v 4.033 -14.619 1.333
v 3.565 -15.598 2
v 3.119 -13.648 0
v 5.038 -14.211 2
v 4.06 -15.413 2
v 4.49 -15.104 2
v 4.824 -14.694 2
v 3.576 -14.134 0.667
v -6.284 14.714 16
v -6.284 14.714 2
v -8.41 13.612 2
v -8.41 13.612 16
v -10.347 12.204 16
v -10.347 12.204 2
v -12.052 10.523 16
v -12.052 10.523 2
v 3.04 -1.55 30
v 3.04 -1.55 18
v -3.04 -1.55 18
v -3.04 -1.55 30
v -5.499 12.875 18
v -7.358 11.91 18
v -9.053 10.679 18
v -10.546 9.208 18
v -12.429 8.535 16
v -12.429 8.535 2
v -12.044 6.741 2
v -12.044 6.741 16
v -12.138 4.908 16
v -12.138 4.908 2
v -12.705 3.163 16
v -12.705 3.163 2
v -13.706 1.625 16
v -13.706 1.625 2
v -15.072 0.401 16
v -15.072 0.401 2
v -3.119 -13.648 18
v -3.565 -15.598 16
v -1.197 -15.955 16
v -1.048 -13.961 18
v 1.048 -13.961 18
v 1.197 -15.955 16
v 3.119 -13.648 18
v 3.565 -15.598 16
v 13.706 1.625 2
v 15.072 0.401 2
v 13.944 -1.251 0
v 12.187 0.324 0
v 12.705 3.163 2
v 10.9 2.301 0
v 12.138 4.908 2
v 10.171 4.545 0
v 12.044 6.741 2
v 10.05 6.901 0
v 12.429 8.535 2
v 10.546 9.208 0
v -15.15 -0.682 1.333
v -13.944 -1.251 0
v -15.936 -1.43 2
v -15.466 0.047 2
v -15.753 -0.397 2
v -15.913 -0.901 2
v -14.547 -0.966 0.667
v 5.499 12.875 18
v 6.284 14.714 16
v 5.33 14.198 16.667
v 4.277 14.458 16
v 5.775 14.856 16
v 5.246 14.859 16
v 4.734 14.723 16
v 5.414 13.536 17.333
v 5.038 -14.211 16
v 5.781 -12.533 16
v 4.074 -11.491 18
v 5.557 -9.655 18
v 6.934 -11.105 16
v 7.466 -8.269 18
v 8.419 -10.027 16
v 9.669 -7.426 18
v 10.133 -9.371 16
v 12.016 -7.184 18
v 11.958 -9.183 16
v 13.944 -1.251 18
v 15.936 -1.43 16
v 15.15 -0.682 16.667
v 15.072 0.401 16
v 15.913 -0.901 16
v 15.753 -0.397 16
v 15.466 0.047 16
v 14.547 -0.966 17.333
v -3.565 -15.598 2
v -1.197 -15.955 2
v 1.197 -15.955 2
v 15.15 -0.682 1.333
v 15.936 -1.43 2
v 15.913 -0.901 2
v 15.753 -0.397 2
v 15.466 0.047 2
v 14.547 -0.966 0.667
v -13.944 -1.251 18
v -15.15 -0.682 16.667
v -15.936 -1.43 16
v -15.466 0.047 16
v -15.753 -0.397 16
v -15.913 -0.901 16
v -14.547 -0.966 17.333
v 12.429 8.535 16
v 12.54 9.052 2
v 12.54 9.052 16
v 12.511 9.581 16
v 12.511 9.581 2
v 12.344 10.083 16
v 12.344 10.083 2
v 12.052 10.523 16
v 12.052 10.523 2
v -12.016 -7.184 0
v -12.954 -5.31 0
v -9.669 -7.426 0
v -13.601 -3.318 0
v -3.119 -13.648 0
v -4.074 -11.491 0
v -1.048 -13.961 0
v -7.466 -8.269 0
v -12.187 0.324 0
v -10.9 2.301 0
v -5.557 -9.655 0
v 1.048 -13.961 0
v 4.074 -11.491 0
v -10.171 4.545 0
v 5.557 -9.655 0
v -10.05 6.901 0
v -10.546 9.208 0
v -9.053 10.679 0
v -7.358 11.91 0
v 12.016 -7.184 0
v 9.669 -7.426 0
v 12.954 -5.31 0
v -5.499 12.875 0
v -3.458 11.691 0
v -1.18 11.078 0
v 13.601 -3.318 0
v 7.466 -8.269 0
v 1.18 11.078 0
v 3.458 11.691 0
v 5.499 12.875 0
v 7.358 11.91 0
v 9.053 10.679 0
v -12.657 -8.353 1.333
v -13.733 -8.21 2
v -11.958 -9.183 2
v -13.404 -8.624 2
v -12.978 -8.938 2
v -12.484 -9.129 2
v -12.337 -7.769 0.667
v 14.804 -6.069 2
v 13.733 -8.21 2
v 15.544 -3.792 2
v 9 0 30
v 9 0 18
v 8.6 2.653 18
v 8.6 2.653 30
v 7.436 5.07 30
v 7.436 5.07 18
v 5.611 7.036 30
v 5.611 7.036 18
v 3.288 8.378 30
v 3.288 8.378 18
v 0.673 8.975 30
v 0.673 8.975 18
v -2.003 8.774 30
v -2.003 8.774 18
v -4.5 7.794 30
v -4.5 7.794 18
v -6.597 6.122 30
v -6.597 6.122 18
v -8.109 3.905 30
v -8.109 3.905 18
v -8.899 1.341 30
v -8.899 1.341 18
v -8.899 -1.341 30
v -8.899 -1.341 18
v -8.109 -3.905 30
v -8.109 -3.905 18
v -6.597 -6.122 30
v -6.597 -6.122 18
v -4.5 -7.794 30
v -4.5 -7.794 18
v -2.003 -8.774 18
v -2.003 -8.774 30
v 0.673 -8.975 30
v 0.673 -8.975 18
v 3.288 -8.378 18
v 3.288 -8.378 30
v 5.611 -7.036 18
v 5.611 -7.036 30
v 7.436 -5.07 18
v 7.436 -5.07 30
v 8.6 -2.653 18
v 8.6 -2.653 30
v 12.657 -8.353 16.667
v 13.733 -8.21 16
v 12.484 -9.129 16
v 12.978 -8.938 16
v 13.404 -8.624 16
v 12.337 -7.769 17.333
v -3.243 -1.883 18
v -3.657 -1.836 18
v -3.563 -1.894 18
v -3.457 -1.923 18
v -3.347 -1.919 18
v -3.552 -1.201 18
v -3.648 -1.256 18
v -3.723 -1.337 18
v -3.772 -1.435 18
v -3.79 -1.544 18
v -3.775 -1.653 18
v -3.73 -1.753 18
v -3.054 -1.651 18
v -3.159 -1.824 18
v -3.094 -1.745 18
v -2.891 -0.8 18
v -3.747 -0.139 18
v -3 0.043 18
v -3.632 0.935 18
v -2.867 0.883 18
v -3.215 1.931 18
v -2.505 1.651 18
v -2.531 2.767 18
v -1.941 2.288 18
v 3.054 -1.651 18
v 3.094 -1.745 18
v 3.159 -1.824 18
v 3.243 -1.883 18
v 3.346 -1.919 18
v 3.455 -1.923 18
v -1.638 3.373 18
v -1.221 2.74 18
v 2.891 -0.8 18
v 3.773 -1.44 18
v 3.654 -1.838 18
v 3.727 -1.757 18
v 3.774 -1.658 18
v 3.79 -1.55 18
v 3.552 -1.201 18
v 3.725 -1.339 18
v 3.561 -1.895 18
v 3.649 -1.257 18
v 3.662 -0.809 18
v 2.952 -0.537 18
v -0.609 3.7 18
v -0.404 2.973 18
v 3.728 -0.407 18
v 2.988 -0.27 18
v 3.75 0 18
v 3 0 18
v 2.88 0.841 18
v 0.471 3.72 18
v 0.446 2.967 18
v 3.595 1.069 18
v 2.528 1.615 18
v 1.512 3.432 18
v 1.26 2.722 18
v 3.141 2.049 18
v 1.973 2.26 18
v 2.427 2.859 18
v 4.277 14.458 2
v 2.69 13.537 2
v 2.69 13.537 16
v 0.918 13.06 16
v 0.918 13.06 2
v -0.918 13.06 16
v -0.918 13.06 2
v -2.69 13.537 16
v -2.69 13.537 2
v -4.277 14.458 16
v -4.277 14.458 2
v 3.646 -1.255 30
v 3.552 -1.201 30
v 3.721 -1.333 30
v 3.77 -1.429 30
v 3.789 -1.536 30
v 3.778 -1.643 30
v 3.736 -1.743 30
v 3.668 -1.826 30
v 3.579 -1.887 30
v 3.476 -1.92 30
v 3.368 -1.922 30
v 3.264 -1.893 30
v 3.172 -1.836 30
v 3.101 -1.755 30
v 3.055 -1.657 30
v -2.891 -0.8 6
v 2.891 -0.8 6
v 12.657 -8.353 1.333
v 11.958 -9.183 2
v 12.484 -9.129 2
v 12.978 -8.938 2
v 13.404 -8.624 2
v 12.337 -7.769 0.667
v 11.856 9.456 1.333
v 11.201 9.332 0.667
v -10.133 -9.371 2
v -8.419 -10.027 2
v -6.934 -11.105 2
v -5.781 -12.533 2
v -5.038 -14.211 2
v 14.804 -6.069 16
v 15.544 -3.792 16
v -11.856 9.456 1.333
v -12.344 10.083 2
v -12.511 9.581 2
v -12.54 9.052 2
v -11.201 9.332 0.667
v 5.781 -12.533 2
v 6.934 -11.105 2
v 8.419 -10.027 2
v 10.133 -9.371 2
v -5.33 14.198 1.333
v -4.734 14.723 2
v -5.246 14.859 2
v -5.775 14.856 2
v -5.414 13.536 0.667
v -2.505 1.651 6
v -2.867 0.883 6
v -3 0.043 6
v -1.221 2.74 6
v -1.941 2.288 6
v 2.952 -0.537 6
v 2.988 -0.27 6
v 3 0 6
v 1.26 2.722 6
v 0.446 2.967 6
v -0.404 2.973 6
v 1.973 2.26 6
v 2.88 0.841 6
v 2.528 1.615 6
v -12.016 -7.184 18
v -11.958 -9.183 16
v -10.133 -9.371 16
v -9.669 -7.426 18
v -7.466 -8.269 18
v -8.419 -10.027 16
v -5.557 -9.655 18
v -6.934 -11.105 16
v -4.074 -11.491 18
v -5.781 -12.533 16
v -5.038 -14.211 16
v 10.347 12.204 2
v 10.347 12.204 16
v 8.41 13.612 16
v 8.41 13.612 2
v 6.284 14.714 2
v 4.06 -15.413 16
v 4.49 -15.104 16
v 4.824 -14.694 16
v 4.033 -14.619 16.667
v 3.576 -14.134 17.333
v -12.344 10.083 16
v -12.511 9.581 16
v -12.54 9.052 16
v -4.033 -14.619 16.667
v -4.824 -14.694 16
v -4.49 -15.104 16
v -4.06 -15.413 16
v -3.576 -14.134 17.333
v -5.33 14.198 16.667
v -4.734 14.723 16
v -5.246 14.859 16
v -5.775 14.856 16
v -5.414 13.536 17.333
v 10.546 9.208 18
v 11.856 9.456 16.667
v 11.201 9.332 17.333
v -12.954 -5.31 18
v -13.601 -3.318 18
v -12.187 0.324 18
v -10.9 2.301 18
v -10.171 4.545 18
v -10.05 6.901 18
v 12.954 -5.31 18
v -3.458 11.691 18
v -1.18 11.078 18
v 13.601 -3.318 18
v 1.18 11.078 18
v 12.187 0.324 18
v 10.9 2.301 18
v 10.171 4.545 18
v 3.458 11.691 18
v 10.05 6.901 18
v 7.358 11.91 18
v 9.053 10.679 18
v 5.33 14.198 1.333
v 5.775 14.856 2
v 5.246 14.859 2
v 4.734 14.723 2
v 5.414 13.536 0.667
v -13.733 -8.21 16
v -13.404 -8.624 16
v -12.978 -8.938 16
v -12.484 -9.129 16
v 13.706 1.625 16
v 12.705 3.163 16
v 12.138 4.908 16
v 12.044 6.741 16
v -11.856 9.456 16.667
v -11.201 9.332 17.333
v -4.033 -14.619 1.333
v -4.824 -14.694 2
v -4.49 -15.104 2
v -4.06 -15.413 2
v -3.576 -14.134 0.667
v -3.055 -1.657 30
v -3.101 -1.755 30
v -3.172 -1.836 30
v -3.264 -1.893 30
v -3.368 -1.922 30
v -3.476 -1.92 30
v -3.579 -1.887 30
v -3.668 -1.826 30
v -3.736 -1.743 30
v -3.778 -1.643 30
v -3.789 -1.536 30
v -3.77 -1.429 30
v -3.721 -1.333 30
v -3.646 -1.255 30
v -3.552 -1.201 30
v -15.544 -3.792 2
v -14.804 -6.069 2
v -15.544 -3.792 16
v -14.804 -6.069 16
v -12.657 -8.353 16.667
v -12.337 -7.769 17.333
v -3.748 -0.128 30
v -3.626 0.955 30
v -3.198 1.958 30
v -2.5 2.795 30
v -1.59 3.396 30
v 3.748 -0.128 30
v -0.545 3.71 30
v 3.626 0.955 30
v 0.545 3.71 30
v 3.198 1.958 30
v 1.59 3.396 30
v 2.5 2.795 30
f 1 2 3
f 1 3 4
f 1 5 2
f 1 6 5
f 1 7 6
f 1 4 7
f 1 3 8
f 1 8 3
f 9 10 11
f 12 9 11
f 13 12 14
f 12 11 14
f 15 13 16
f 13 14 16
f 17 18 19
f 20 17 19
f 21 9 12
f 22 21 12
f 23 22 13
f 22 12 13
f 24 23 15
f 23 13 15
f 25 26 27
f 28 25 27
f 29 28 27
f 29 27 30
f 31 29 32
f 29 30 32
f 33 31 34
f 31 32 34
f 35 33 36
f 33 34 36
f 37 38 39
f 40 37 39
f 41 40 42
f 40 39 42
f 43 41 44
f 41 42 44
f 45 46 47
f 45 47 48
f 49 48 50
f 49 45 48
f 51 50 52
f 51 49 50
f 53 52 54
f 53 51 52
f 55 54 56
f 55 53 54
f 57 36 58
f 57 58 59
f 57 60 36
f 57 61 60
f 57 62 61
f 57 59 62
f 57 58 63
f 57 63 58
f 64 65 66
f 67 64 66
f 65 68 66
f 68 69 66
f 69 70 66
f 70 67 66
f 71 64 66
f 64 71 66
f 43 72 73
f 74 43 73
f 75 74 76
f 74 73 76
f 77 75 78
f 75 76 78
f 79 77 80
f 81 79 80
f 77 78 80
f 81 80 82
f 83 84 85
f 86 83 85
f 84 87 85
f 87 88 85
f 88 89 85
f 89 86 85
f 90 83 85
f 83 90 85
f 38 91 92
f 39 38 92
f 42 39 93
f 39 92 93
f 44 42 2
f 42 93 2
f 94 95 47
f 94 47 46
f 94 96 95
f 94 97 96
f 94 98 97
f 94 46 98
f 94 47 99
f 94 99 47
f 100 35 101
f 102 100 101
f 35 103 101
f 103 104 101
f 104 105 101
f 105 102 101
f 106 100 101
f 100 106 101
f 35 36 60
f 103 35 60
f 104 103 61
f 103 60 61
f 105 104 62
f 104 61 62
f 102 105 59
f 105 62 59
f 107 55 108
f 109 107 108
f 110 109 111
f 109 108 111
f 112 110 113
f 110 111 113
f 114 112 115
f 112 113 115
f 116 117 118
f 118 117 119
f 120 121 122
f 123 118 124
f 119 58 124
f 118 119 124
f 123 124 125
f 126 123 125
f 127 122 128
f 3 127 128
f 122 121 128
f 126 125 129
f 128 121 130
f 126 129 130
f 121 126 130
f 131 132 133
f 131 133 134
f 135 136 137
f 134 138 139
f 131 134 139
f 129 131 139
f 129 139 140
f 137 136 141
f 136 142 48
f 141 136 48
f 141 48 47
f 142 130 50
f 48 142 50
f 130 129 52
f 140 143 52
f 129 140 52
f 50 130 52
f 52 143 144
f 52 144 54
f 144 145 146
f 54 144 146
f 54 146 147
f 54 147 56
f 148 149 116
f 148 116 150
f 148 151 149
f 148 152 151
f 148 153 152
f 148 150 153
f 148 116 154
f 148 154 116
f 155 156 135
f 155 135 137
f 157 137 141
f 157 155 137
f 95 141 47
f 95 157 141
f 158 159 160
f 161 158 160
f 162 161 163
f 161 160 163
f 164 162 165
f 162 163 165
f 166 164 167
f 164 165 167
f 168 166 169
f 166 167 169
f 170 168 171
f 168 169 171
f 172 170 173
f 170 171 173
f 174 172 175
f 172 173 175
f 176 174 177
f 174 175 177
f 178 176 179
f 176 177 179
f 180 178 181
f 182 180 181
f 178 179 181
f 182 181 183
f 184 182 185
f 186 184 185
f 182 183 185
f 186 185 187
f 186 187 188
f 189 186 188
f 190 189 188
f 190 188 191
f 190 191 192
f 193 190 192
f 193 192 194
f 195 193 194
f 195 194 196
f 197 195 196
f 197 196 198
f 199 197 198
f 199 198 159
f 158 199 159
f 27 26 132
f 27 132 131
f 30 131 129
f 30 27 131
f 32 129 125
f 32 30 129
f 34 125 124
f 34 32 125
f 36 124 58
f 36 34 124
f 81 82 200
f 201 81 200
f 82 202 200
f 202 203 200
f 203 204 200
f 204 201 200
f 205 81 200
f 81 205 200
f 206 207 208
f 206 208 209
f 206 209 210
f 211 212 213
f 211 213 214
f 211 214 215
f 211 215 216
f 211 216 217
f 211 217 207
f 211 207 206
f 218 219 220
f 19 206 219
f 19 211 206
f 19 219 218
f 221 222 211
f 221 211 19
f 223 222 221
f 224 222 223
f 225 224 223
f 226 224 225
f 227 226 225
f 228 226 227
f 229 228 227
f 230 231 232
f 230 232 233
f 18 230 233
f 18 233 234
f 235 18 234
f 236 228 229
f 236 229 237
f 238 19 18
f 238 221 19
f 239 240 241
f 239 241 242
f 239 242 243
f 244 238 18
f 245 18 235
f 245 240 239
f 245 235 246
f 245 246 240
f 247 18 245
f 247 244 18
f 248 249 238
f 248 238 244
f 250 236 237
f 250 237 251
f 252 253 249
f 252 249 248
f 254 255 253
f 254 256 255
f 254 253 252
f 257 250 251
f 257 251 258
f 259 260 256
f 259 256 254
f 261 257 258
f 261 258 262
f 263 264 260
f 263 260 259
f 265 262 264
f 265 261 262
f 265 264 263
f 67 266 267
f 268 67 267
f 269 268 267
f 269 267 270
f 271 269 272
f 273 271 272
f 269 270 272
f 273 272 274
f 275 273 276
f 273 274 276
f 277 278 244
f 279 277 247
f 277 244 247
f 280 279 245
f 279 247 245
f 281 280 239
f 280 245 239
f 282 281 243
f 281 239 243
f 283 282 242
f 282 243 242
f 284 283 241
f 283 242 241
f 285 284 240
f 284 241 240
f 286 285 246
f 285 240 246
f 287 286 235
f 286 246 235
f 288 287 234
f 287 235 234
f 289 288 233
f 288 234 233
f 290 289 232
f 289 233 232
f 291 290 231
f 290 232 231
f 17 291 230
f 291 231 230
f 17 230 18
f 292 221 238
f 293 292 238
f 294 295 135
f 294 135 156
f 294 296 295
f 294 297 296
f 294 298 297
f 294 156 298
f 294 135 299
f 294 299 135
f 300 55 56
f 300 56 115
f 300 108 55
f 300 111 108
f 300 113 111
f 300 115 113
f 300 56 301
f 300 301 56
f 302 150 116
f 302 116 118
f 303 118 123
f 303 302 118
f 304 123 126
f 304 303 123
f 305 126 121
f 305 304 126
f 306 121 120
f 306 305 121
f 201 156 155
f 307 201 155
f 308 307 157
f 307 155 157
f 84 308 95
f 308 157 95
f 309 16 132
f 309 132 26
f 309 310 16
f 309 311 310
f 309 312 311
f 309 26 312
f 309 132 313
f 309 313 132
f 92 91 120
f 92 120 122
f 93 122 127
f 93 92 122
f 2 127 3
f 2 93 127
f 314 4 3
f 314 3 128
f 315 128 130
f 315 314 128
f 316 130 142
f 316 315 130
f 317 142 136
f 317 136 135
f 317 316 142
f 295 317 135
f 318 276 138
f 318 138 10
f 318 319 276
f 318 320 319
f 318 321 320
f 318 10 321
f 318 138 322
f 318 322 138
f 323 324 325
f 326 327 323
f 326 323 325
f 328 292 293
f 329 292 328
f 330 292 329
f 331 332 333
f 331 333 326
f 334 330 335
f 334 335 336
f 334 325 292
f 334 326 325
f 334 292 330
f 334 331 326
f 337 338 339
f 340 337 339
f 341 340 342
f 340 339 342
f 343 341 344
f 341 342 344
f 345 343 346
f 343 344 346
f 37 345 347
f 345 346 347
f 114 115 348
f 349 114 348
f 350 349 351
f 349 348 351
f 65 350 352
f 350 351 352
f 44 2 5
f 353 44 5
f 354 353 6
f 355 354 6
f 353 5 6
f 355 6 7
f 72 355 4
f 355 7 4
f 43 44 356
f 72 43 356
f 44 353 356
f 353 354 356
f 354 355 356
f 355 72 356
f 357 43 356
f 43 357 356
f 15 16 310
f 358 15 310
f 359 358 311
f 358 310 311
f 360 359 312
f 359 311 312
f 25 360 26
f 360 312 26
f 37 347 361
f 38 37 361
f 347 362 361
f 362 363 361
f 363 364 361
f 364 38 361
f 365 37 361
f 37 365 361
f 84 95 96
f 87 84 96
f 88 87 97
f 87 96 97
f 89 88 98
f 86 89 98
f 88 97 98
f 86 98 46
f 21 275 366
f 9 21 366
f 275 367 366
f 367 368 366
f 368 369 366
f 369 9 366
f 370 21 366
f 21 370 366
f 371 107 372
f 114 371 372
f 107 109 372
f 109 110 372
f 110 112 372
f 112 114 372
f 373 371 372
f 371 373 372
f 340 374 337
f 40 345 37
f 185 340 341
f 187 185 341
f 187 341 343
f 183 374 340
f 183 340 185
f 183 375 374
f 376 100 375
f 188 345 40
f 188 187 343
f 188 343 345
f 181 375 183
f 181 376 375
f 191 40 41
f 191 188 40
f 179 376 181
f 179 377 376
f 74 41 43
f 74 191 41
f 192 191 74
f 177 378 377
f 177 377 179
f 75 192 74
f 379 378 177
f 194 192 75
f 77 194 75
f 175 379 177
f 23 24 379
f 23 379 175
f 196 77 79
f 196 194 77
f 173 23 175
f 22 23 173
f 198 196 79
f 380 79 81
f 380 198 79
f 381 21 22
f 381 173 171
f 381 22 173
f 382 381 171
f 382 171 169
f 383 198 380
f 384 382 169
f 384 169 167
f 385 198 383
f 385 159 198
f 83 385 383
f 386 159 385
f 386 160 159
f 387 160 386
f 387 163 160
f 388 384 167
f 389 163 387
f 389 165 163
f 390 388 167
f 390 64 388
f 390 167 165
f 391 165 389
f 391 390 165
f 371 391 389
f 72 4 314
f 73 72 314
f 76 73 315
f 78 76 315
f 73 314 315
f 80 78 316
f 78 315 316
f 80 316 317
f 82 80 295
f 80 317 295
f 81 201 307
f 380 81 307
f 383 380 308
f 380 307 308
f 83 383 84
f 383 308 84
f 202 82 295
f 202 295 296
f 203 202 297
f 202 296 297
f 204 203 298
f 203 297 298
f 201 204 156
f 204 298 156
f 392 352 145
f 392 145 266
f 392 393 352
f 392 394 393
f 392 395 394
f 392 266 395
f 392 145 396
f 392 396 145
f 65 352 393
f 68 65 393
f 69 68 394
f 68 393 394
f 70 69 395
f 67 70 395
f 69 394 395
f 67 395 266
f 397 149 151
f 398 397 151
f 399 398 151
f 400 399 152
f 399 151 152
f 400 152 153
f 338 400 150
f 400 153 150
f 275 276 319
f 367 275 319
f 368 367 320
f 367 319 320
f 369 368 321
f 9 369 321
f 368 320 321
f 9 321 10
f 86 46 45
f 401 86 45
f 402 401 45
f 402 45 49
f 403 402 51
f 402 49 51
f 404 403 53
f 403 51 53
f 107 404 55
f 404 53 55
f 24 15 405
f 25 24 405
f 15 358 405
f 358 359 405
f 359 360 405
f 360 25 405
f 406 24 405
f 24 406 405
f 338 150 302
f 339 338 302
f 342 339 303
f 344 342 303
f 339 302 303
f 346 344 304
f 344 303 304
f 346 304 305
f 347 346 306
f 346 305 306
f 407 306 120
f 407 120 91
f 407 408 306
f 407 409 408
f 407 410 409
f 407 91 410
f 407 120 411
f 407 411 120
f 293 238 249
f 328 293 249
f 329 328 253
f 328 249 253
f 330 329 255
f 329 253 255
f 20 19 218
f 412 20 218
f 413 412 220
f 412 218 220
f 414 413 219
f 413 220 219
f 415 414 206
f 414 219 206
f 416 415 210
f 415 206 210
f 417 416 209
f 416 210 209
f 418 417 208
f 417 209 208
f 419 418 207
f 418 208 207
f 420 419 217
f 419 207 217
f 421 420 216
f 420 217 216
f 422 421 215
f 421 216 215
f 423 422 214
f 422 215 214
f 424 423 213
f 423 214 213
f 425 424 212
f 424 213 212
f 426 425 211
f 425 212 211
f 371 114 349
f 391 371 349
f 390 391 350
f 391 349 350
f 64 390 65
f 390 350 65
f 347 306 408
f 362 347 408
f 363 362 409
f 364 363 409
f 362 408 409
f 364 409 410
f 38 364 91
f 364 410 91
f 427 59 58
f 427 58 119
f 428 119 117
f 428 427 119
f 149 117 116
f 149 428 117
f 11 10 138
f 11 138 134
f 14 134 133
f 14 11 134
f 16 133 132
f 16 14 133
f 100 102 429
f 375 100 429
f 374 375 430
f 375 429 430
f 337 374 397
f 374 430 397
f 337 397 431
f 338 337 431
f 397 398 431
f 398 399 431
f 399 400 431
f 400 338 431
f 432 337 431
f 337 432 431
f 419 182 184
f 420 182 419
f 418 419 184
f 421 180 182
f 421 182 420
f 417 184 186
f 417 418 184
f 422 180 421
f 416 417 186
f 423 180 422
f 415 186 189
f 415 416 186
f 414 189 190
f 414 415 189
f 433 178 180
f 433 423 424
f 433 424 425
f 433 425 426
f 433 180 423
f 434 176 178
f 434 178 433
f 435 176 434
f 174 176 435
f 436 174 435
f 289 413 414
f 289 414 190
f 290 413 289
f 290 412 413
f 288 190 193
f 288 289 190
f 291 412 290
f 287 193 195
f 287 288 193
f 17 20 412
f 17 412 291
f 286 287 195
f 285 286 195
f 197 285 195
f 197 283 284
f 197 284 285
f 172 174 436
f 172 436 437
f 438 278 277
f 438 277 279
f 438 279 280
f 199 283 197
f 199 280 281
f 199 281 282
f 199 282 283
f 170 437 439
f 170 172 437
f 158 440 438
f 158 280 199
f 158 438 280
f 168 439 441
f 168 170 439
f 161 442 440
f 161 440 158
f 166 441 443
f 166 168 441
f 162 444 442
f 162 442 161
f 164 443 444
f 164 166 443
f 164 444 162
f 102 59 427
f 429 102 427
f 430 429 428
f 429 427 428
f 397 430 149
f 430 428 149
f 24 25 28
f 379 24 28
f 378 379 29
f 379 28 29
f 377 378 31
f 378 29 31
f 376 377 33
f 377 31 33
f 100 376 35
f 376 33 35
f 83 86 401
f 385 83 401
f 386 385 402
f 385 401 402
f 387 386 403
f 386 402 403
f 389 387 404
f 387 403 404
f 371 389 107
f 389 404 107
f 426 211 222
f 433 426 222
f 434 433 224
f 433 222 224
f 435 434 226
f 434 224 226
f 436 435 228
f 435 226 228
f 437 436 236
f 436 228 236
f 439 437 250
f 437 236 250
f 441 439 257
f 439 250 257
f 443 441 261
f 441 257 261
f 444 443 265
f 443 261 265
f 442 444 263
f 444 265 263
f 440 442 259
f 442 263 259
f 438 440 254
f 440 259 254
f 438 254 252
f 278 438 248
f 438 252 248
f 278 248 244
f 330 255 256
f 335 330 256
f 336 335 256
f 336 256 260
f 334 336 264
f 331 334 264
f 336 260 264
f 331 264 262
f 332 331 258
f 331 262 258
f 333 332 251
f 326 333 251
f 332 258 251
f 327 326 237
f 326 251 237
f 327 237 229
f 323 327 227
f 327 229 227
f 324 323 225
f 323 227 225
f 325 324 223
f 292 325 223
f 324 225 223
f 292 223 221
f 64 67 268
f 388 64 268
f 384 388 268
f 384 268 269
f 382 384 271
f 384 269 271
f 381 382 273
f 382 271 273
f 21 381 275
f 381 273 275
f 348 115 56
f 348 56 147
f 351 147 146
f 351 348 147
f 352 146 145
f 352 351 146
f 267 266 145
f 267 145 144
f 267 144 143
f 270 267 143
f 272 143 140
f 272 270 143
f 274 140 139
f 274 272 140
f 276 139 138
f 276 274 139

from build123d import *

# Parameters (mm, degrees)
F1_R      = 9
F2_DEPTH  = 12
F2_FACE_R = 9
F3_DEPTH  = 18
F5_DEPTH  = 12
F6_SIZE   = 1.99999


# Not quite as in the source:
# - a fillet or chamfer is up to 0.001 mm smaller than in the source, because OpenCascade refuses the exact size


with BuildPart() as f2:
    # F1 (on Top) → F2 (new body)
    with BuildSketch(Plane.XY):
        Circle(F1_R)
        with BuildLine():
            ThreePointArc((-3.5524069735, -1.2012096798), (-0.6086763711, 3.7002720272), (3.75, 0))
            ThreePointArc((3.75, 0), (3.7002720272, -0.6086763711), (3.5524069735, -1.2012096798))
            ThreePointArc((3.5524069735, -1.2012096798), (3.7247345197, -1.339079143), (3.7896742158, -1.55))
            ThreePointArc((3.7896742158, -1.55), (3.6098282416, -1.8702185288), (3.242794716, -1.8832903202))
            ThreePointArc((3.242794716, -1.8832903202), (0, -3.75), (-3.242794716, -1.8832903202))
            ThreePointArc((-3.242794716, -1.8832903202), (-3.7561416374, -1.705), (-3.5524069735, -1.2012096798))
        make_face(mode=Mode.SUBTRACT)
        with BuildLine():
            Line((3.0396742158, -1.55), (-3.0396742158, -1.55))
            ThreePointArc((-3.0396742158, -1.55), (-3.0944556869, -1.7451540258), (-3.242794716, -1.8832903202))
            ThreePointArc((-3.242794716, -1.8832903202), (0, -3.75), (3.242794716, -1.8832903202))
            ThreePointArc((3.242794716, -1.8832903202), (3.0944556869, -1.7451540258), (3.0396742158, -1.55))
        make_face()
    extrude(amount=F2_DEPTH)

    # F1 (on Top) + F2_face (on face) → F3 (join)
    with BuildSketch(Plane.XY):
        with BuildLine():
            ThreePointArc((-4.2766728371, 14.4583333333), (-5.2456206791, 14.8589384831), (-6.2840906994, 14.7142857143))
            ThreePointArc((-6.2840906994, 14.7142857143), (-9.4045640367, 12.94427191), (-12.0522264909, 10.5234897545))
            ThreePointArc((-12.0522264909, 10.5234897545), (-12.5107043337, 9.5805462385), (-12.4291275454, 8.5352282801))
            ThreePointArc((-12.4291275454, 8.5352282801), (-12.3637347118, 4.0172209269), (-15.0722567175, 0.4005131406))
            ThreePointArc((-15.0722567175, 0.4005131406), (-15.7526762055, -0.3972172192), (-15.9360081315, -1.4295610629))
            ThreePointArc((-15.9360081315, -1.4295610629), (-15.2169042607, -4.94427191), (-13.7327763109, -8.2104113658))
            ThreePointArc((-13.7327763109, -8.2104113658), (-12.9776611805, -8.9378352769), (-11.9582961107, -9.1832721545))
            ThreePointArc((-11.9582961107, -9.1832721545), (-7.6412082798, -10.5172209269), (-5.0384941015, -14.2108025995))
            ThreePointArc((-5.0384941015, -14.2108025995), (-4.4900686296, -15.1044322255), (-3.5649039709, -15.5978030401))
            ThreePointArc((-3.5649039709, -15.5978030401), (0, -16), (3.5649039709, -15.5978030401))
            ThreePointArc((3.5649039709, -15.5978030401), (4.4900686296, -15.1044322255), (5.0384941015, -14.2108025995))
            ThreePointArc((5.0384941015, -14.2108025995), (7.6412082798, -10.5172209269), (11.9582961107, -9.1832721545))
            ThreePointArc((11.9582961107, -9.1832721545), (12.9776611805, -8.9378352769), (13.7327763109, -8.2104113658))
            ThreePointArc((13.7327763109, -8.2104113658), (15.2169042607, -4.94427191), (15.9360081315, -1.4295610629))
            ThreePointArc((15.9360081315, -1.4295610629), (15.7526762055, -0.3972172192), (15.0722567175, 0.4005131406))
            ThreePointArc((15.0722567175, 0.4005131406), (12.3637347118, 4.0172209269), (12.4291275454, 8.5352282801))
            ThreePointArc((12.4291275454, 8.5352282801), (12.5107043337, 9.5805462385), (12.0522264909, 10.5234897545))
            ThreePointArc((12.0522264909, 10.5234897545), (9.4045640367, 12.94427191), (6.2840906994, 14.7142857143))
            ThreePointArc((6.2840906994, 14.7142857143), (5.2456206791, 14.8589384831), (4.2766728371, 14.4583333333))
            ThreePointArc((4.2766728371, 14.4583333333), (0, 13), (-4.2766728371, 14.4583333333))
        make_face()
        Circle(F1_R, mode=Mode.SUBTRACT)
        with BuildLine():
            ThreePointArc((3.5524069735, -1.2012096798), (3.7002720272, -0.6086763711), (3.75, 0))
            ThreePointArc((3.75, 0), (-0.6086763711, 3.7002720272), (-3.5524069735, -1.2012096798))
            ThreePointArc((-3.5524069735, -1.2012096798), (-3.2037533587, -1.2399396961), (-3.0396742158, -1.55))
            Line((-3.0396742158, -1.55), (3.0396742158, -1.55))
            ThreePointArc((3.0396742158, -1.55), (3.2037533587, -1.2399396961), (3.5524069735, -1.2012096798))
        make_face()
        with BuildLine():
            ThreePointArc((-3.4146742158, -1.55), (-3.487903202, -1.3773275768), (-3.5524069735, -1.2012096798))
            ThreePointArc((-3.5524069735, -1.2012096798), (-3.7561416374, -1.705), (-3.242794716, -1.8832903202))
            ThreePointArc((-3.242794716, -1.8832903202), (-3.332903202, -1.7187949983), (-3.4146742158, -1.55))
        make_face()
        with BuildLine():
            ThreePointArc((-3.0396742158, -1.55), (-3.2037533587, -1.2399396961), (-3.5524069735, -1.2012096798))
            ThreePointArc((-3.5524069735, -1.2012096798), (-3.487903202, -1.3773275768), (-3.4146742158, -1.55))
            Line((-3.4146742158, -1.55), (-3.0396742158, -1.55))
        make_face()
        with BuildLine():
            Line((-3.0396742158, -1.55), (-3.4146742158, -1.55))
            ThreePointArc((-3.4146742158, -1.55), (-3.332903202, -1.7187949983), (-3.242794716, -1.8832903202))
            ThreePointArc((-3.242794716, -1.8832903202), (-3.0944556869, -1.7451540258), (-3.0396742158, -1.55))
        make_face()
        with BuildLine():
            ThreePointArc((3.4146742158, -1.55), (3.487903202, -1.3773275768), (3.5524069735, -1.2012096798))
            ThreePointArc((3.5524069735, -1.2012096798), (3.2037533587, -1.2399396961), (3.0396742158, -1.55))
            Line((3.0396742158, -1.55), (3.4146742158, -1.55))
        make_face()
        with BuildLine():
            ThreePointArc((3.242794716, -1.8832903202), (3.332903202, -1.7187949983), (3.4146742158, -1.55))
            Line((3.4146742158, -1.55), (3.0396742158, -1.55))
            ThreePointArc((3.0396742158, -1.55), (3.0944556869, -1.7451540258), (3.242794716, -1.8832903202))
        make_face()
        with BuildLine():
            ThreePointArc((3.7896742158, -1.55), (3.7247345197, -1.339079143), (3.5524069735, -1.2012096798))
            ThreePointArc((3.5524069735, -1.2012096798), (3.487903202, -1.3773275768), (3.4146742158, -1.55))
            ThreePointArc((3.4146742158, -1.55), (3.332903202, -1.7187949983), (3.242794716, -1.8832903202))
            ThreePointArc((3.242794716, -1.8832903202), (3.6098282416, -1.8702185288), (3.7896742158, -1.55))
        make_face()
    with BuildSketch(Plane(origin=(0, -0.1158950357, 12), x_dir=(1, 0, 0), z_dir=(0, 0, 1))):
        with Locations((0, 0.1158950357)):
            Circle(F2_FACE_R)
        with BuildLine():
            ThreePointArc((-3.5524069735, -1.0853146441), (0, 3.8658950357), (3.5524069735, -1.0853146441))
            ThreePointArc((3.5524069735, -1.0853146441), (3.6255950728, -1.7441652682), (3.0396742158, -1.4341049643))
            Line((3.0396742158, -1.4341049643), (-3.0396742158, -1.4341049643))
            ThreePointArc((-3.0396742158, -1.4341049643), (-3.6255950728, -1.7441652682), (-3.5524069735, -1.0853146441))
        make_face(mode=Mode.SUBTRACT)
    extrude(amount=F3_DEPTH)

    # F4 (on face) → F5 (cut)
    with BuildSketch(Plane.XY.offset(18)):
        with BuildLine():
            ThreePointArc((2.891366459, -0.8), (2.9727175595, -0.4036710437), (3, 0))
            ThreePointArc((3, 0), (-0.4036710437, 2.9727175595), (-2.891366459, -0.8))
            Line((-2.891366459, -0.8), (2.891366459, -0.8))
        make_face()
    extrude(amount=-F5_DEPTH, mode=Mode.SUBTRACT)

    # F6 (size 2 in the source; OpenCascade refuses exactly that, so slightly less here)
    f6_edges = [f2.edges().sort_by_distance(p)[0] for p in [
        (0, -16, 18),
        (0, -16, 0),
    ]]
    chamfer(f6_edges, length=F6_SIZE)


solid = f2.part
